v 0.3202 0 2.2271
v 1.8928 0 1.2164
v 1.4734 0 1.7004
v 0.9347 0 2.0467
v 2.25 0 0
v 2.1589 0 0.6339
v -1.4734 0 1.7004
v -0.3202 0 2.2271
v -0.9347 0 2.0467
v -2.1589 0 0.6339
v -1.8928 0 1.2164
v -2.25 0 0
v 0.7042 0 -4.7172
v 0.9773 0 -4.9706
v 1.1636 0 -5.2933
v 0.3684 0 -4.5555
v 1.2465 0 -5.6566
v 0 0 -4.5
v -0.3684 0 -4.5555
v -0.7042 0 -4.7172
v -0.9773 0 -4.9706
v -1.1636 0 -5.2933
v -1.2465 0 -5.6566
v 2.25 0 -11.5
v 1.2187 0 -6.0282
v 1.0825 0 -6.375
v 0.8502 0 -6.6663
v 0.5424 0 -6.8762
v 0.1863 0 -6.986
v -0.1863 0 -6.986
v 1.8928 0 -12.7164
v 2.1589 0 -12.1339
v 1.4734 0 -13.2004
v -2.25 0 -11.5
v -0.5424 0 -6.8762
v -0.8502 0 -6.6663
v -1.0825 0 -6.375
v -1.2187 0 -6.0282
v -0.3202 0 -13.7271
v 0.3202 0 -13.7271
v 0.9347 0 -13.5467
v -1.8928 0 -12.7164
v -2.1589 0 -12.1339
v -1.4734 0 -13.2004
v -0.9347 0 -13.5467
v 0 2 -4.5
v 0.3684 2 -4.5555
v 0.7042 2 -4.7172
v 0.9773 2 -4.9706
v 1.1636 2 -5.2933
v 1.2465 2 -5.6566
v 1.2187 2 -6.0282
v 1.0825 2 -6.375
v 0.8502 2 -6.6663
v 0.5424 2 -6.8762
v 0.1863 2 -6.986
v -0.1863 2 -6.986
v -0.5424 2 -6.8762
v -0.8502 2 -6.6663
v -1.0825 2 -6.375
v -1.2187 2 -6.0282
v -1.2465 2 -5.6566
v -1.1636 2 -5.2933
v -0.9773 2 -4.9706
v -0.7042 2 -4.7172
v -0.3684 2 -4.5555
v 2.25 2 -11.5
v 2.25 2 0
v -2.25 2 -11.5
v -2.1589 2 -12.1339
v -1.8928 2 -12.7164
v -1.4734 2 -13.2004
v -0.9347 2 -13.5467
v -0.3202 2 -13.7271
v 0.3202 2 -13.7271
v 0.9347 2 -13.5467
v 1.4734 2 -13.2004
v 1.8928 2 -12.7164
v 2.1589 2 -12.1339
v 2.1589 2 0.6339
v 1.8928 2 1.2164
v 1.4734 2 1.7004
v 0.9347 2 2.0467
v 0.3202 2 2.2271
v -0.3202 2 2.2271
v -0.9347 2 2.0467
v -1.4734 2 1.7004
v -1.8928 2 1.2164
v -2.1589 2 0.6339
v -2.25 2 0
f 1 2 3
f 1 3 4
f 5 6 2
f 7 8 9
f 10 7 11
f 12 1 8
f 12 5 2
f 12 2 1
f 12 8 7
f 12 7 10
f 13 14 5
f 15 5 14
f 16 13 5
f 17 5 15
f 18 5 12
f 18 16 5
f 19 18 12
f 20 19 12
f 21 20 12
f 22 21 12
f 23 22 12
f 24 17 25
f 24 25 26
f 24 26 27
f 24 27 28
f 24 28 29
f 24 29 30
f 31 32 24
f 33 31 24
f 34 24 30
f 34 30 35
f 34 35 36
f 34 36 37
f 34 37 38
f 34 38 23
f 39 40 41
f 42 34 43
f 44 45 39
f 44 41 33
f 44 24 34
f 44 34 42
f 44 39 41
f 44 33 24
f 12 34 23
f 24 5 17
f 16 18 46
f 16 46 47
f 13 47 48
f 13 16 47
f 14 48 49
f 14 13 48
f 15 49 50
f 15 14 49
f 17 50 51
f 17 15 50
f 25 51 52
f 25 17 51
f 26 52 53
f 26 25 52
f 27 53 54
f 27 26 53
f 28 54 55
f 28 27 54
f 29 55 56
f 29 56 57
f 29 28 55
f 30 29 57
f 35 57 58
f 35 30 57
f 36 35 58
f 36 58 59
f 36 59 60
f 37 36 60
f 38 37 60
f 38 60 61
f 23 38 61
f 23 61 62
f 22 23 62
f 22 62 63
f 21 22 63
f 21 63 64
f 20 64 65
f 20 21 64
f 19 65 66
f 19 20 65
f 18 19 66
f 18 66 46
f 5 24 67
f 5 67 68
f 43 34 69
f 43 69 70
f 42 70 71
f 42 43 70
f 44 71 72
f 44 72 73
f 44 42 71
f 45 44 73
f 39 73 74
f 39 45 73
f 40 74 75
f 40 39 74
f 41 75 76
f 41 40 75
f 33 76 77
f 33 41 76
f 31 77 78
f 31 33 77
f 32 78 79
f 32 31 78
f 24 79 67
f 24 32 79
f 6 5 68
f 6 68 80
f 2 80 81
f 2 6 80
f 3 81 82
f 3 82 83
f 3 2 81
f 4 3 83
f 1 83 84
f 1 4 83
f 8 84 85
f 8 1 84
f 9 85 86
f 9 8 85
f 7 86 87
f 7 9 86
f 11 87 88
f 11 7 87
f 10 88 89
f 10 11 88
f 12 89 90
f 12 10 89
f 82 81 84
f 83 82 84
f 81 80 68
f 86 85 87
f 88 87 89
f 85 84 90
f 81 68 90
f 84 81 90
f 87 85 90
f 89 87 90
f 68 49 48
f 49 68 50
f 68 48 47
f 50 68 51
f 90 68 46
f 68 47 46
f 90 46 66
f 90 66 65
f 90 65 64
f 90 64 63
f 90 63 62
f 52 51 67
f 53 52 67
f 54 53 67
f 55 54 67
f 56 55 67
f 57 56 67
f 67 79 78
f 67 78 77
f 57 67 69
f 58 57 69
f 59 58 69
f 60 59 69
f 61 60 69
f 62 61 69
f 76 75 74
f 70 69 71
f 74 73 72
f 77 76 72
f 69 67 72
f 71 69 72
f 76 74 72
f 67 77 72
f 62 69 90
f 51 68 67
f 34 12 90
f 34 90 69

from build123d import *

# Parameters (mm, degrees)
SKETCH1_R           = 1
BOSS_EXTRUDE1_DEPTH = 2
MOVE_FACE1_BY       = 0.25


with BuildPart() as part:
    # Sketch1 → Boss-Extrude1 (new body)
    with BuildSketch(Plane(origin=(0, 0, 0), x_dir=(1, 0, 0), z_dir=(0, 1, 0))):
        with BuildLine():
            Line((-2.25, 0), (-2.25, 11.5))
            ThreePointArc((-2.25, 11.5), (0, 13.75), (2.25, 11.5))
            Line((2.25, 11.5), (2.25, 0))
            ThreePointArc((2.25, 0), (0, -2.25), (-2.25, 0))
        make_face()
        with Locations(Location((0, 5.75, 0), (0, 0, 270))):
            Circle(SKETCH1_R, mode=Mode.SUBTRACT)
    extrude(amount=BOSS_EXTRUDE1_DEPTH)

    # Move Face1: a curved face moved inward by 0.25
    add(Solid.thicken(part.faces().sort_by_distance((0, 1, -6.75))[0], -MOVE_FACE1_BY), mode=Mode.SUBTRACT)


solid = part.part
